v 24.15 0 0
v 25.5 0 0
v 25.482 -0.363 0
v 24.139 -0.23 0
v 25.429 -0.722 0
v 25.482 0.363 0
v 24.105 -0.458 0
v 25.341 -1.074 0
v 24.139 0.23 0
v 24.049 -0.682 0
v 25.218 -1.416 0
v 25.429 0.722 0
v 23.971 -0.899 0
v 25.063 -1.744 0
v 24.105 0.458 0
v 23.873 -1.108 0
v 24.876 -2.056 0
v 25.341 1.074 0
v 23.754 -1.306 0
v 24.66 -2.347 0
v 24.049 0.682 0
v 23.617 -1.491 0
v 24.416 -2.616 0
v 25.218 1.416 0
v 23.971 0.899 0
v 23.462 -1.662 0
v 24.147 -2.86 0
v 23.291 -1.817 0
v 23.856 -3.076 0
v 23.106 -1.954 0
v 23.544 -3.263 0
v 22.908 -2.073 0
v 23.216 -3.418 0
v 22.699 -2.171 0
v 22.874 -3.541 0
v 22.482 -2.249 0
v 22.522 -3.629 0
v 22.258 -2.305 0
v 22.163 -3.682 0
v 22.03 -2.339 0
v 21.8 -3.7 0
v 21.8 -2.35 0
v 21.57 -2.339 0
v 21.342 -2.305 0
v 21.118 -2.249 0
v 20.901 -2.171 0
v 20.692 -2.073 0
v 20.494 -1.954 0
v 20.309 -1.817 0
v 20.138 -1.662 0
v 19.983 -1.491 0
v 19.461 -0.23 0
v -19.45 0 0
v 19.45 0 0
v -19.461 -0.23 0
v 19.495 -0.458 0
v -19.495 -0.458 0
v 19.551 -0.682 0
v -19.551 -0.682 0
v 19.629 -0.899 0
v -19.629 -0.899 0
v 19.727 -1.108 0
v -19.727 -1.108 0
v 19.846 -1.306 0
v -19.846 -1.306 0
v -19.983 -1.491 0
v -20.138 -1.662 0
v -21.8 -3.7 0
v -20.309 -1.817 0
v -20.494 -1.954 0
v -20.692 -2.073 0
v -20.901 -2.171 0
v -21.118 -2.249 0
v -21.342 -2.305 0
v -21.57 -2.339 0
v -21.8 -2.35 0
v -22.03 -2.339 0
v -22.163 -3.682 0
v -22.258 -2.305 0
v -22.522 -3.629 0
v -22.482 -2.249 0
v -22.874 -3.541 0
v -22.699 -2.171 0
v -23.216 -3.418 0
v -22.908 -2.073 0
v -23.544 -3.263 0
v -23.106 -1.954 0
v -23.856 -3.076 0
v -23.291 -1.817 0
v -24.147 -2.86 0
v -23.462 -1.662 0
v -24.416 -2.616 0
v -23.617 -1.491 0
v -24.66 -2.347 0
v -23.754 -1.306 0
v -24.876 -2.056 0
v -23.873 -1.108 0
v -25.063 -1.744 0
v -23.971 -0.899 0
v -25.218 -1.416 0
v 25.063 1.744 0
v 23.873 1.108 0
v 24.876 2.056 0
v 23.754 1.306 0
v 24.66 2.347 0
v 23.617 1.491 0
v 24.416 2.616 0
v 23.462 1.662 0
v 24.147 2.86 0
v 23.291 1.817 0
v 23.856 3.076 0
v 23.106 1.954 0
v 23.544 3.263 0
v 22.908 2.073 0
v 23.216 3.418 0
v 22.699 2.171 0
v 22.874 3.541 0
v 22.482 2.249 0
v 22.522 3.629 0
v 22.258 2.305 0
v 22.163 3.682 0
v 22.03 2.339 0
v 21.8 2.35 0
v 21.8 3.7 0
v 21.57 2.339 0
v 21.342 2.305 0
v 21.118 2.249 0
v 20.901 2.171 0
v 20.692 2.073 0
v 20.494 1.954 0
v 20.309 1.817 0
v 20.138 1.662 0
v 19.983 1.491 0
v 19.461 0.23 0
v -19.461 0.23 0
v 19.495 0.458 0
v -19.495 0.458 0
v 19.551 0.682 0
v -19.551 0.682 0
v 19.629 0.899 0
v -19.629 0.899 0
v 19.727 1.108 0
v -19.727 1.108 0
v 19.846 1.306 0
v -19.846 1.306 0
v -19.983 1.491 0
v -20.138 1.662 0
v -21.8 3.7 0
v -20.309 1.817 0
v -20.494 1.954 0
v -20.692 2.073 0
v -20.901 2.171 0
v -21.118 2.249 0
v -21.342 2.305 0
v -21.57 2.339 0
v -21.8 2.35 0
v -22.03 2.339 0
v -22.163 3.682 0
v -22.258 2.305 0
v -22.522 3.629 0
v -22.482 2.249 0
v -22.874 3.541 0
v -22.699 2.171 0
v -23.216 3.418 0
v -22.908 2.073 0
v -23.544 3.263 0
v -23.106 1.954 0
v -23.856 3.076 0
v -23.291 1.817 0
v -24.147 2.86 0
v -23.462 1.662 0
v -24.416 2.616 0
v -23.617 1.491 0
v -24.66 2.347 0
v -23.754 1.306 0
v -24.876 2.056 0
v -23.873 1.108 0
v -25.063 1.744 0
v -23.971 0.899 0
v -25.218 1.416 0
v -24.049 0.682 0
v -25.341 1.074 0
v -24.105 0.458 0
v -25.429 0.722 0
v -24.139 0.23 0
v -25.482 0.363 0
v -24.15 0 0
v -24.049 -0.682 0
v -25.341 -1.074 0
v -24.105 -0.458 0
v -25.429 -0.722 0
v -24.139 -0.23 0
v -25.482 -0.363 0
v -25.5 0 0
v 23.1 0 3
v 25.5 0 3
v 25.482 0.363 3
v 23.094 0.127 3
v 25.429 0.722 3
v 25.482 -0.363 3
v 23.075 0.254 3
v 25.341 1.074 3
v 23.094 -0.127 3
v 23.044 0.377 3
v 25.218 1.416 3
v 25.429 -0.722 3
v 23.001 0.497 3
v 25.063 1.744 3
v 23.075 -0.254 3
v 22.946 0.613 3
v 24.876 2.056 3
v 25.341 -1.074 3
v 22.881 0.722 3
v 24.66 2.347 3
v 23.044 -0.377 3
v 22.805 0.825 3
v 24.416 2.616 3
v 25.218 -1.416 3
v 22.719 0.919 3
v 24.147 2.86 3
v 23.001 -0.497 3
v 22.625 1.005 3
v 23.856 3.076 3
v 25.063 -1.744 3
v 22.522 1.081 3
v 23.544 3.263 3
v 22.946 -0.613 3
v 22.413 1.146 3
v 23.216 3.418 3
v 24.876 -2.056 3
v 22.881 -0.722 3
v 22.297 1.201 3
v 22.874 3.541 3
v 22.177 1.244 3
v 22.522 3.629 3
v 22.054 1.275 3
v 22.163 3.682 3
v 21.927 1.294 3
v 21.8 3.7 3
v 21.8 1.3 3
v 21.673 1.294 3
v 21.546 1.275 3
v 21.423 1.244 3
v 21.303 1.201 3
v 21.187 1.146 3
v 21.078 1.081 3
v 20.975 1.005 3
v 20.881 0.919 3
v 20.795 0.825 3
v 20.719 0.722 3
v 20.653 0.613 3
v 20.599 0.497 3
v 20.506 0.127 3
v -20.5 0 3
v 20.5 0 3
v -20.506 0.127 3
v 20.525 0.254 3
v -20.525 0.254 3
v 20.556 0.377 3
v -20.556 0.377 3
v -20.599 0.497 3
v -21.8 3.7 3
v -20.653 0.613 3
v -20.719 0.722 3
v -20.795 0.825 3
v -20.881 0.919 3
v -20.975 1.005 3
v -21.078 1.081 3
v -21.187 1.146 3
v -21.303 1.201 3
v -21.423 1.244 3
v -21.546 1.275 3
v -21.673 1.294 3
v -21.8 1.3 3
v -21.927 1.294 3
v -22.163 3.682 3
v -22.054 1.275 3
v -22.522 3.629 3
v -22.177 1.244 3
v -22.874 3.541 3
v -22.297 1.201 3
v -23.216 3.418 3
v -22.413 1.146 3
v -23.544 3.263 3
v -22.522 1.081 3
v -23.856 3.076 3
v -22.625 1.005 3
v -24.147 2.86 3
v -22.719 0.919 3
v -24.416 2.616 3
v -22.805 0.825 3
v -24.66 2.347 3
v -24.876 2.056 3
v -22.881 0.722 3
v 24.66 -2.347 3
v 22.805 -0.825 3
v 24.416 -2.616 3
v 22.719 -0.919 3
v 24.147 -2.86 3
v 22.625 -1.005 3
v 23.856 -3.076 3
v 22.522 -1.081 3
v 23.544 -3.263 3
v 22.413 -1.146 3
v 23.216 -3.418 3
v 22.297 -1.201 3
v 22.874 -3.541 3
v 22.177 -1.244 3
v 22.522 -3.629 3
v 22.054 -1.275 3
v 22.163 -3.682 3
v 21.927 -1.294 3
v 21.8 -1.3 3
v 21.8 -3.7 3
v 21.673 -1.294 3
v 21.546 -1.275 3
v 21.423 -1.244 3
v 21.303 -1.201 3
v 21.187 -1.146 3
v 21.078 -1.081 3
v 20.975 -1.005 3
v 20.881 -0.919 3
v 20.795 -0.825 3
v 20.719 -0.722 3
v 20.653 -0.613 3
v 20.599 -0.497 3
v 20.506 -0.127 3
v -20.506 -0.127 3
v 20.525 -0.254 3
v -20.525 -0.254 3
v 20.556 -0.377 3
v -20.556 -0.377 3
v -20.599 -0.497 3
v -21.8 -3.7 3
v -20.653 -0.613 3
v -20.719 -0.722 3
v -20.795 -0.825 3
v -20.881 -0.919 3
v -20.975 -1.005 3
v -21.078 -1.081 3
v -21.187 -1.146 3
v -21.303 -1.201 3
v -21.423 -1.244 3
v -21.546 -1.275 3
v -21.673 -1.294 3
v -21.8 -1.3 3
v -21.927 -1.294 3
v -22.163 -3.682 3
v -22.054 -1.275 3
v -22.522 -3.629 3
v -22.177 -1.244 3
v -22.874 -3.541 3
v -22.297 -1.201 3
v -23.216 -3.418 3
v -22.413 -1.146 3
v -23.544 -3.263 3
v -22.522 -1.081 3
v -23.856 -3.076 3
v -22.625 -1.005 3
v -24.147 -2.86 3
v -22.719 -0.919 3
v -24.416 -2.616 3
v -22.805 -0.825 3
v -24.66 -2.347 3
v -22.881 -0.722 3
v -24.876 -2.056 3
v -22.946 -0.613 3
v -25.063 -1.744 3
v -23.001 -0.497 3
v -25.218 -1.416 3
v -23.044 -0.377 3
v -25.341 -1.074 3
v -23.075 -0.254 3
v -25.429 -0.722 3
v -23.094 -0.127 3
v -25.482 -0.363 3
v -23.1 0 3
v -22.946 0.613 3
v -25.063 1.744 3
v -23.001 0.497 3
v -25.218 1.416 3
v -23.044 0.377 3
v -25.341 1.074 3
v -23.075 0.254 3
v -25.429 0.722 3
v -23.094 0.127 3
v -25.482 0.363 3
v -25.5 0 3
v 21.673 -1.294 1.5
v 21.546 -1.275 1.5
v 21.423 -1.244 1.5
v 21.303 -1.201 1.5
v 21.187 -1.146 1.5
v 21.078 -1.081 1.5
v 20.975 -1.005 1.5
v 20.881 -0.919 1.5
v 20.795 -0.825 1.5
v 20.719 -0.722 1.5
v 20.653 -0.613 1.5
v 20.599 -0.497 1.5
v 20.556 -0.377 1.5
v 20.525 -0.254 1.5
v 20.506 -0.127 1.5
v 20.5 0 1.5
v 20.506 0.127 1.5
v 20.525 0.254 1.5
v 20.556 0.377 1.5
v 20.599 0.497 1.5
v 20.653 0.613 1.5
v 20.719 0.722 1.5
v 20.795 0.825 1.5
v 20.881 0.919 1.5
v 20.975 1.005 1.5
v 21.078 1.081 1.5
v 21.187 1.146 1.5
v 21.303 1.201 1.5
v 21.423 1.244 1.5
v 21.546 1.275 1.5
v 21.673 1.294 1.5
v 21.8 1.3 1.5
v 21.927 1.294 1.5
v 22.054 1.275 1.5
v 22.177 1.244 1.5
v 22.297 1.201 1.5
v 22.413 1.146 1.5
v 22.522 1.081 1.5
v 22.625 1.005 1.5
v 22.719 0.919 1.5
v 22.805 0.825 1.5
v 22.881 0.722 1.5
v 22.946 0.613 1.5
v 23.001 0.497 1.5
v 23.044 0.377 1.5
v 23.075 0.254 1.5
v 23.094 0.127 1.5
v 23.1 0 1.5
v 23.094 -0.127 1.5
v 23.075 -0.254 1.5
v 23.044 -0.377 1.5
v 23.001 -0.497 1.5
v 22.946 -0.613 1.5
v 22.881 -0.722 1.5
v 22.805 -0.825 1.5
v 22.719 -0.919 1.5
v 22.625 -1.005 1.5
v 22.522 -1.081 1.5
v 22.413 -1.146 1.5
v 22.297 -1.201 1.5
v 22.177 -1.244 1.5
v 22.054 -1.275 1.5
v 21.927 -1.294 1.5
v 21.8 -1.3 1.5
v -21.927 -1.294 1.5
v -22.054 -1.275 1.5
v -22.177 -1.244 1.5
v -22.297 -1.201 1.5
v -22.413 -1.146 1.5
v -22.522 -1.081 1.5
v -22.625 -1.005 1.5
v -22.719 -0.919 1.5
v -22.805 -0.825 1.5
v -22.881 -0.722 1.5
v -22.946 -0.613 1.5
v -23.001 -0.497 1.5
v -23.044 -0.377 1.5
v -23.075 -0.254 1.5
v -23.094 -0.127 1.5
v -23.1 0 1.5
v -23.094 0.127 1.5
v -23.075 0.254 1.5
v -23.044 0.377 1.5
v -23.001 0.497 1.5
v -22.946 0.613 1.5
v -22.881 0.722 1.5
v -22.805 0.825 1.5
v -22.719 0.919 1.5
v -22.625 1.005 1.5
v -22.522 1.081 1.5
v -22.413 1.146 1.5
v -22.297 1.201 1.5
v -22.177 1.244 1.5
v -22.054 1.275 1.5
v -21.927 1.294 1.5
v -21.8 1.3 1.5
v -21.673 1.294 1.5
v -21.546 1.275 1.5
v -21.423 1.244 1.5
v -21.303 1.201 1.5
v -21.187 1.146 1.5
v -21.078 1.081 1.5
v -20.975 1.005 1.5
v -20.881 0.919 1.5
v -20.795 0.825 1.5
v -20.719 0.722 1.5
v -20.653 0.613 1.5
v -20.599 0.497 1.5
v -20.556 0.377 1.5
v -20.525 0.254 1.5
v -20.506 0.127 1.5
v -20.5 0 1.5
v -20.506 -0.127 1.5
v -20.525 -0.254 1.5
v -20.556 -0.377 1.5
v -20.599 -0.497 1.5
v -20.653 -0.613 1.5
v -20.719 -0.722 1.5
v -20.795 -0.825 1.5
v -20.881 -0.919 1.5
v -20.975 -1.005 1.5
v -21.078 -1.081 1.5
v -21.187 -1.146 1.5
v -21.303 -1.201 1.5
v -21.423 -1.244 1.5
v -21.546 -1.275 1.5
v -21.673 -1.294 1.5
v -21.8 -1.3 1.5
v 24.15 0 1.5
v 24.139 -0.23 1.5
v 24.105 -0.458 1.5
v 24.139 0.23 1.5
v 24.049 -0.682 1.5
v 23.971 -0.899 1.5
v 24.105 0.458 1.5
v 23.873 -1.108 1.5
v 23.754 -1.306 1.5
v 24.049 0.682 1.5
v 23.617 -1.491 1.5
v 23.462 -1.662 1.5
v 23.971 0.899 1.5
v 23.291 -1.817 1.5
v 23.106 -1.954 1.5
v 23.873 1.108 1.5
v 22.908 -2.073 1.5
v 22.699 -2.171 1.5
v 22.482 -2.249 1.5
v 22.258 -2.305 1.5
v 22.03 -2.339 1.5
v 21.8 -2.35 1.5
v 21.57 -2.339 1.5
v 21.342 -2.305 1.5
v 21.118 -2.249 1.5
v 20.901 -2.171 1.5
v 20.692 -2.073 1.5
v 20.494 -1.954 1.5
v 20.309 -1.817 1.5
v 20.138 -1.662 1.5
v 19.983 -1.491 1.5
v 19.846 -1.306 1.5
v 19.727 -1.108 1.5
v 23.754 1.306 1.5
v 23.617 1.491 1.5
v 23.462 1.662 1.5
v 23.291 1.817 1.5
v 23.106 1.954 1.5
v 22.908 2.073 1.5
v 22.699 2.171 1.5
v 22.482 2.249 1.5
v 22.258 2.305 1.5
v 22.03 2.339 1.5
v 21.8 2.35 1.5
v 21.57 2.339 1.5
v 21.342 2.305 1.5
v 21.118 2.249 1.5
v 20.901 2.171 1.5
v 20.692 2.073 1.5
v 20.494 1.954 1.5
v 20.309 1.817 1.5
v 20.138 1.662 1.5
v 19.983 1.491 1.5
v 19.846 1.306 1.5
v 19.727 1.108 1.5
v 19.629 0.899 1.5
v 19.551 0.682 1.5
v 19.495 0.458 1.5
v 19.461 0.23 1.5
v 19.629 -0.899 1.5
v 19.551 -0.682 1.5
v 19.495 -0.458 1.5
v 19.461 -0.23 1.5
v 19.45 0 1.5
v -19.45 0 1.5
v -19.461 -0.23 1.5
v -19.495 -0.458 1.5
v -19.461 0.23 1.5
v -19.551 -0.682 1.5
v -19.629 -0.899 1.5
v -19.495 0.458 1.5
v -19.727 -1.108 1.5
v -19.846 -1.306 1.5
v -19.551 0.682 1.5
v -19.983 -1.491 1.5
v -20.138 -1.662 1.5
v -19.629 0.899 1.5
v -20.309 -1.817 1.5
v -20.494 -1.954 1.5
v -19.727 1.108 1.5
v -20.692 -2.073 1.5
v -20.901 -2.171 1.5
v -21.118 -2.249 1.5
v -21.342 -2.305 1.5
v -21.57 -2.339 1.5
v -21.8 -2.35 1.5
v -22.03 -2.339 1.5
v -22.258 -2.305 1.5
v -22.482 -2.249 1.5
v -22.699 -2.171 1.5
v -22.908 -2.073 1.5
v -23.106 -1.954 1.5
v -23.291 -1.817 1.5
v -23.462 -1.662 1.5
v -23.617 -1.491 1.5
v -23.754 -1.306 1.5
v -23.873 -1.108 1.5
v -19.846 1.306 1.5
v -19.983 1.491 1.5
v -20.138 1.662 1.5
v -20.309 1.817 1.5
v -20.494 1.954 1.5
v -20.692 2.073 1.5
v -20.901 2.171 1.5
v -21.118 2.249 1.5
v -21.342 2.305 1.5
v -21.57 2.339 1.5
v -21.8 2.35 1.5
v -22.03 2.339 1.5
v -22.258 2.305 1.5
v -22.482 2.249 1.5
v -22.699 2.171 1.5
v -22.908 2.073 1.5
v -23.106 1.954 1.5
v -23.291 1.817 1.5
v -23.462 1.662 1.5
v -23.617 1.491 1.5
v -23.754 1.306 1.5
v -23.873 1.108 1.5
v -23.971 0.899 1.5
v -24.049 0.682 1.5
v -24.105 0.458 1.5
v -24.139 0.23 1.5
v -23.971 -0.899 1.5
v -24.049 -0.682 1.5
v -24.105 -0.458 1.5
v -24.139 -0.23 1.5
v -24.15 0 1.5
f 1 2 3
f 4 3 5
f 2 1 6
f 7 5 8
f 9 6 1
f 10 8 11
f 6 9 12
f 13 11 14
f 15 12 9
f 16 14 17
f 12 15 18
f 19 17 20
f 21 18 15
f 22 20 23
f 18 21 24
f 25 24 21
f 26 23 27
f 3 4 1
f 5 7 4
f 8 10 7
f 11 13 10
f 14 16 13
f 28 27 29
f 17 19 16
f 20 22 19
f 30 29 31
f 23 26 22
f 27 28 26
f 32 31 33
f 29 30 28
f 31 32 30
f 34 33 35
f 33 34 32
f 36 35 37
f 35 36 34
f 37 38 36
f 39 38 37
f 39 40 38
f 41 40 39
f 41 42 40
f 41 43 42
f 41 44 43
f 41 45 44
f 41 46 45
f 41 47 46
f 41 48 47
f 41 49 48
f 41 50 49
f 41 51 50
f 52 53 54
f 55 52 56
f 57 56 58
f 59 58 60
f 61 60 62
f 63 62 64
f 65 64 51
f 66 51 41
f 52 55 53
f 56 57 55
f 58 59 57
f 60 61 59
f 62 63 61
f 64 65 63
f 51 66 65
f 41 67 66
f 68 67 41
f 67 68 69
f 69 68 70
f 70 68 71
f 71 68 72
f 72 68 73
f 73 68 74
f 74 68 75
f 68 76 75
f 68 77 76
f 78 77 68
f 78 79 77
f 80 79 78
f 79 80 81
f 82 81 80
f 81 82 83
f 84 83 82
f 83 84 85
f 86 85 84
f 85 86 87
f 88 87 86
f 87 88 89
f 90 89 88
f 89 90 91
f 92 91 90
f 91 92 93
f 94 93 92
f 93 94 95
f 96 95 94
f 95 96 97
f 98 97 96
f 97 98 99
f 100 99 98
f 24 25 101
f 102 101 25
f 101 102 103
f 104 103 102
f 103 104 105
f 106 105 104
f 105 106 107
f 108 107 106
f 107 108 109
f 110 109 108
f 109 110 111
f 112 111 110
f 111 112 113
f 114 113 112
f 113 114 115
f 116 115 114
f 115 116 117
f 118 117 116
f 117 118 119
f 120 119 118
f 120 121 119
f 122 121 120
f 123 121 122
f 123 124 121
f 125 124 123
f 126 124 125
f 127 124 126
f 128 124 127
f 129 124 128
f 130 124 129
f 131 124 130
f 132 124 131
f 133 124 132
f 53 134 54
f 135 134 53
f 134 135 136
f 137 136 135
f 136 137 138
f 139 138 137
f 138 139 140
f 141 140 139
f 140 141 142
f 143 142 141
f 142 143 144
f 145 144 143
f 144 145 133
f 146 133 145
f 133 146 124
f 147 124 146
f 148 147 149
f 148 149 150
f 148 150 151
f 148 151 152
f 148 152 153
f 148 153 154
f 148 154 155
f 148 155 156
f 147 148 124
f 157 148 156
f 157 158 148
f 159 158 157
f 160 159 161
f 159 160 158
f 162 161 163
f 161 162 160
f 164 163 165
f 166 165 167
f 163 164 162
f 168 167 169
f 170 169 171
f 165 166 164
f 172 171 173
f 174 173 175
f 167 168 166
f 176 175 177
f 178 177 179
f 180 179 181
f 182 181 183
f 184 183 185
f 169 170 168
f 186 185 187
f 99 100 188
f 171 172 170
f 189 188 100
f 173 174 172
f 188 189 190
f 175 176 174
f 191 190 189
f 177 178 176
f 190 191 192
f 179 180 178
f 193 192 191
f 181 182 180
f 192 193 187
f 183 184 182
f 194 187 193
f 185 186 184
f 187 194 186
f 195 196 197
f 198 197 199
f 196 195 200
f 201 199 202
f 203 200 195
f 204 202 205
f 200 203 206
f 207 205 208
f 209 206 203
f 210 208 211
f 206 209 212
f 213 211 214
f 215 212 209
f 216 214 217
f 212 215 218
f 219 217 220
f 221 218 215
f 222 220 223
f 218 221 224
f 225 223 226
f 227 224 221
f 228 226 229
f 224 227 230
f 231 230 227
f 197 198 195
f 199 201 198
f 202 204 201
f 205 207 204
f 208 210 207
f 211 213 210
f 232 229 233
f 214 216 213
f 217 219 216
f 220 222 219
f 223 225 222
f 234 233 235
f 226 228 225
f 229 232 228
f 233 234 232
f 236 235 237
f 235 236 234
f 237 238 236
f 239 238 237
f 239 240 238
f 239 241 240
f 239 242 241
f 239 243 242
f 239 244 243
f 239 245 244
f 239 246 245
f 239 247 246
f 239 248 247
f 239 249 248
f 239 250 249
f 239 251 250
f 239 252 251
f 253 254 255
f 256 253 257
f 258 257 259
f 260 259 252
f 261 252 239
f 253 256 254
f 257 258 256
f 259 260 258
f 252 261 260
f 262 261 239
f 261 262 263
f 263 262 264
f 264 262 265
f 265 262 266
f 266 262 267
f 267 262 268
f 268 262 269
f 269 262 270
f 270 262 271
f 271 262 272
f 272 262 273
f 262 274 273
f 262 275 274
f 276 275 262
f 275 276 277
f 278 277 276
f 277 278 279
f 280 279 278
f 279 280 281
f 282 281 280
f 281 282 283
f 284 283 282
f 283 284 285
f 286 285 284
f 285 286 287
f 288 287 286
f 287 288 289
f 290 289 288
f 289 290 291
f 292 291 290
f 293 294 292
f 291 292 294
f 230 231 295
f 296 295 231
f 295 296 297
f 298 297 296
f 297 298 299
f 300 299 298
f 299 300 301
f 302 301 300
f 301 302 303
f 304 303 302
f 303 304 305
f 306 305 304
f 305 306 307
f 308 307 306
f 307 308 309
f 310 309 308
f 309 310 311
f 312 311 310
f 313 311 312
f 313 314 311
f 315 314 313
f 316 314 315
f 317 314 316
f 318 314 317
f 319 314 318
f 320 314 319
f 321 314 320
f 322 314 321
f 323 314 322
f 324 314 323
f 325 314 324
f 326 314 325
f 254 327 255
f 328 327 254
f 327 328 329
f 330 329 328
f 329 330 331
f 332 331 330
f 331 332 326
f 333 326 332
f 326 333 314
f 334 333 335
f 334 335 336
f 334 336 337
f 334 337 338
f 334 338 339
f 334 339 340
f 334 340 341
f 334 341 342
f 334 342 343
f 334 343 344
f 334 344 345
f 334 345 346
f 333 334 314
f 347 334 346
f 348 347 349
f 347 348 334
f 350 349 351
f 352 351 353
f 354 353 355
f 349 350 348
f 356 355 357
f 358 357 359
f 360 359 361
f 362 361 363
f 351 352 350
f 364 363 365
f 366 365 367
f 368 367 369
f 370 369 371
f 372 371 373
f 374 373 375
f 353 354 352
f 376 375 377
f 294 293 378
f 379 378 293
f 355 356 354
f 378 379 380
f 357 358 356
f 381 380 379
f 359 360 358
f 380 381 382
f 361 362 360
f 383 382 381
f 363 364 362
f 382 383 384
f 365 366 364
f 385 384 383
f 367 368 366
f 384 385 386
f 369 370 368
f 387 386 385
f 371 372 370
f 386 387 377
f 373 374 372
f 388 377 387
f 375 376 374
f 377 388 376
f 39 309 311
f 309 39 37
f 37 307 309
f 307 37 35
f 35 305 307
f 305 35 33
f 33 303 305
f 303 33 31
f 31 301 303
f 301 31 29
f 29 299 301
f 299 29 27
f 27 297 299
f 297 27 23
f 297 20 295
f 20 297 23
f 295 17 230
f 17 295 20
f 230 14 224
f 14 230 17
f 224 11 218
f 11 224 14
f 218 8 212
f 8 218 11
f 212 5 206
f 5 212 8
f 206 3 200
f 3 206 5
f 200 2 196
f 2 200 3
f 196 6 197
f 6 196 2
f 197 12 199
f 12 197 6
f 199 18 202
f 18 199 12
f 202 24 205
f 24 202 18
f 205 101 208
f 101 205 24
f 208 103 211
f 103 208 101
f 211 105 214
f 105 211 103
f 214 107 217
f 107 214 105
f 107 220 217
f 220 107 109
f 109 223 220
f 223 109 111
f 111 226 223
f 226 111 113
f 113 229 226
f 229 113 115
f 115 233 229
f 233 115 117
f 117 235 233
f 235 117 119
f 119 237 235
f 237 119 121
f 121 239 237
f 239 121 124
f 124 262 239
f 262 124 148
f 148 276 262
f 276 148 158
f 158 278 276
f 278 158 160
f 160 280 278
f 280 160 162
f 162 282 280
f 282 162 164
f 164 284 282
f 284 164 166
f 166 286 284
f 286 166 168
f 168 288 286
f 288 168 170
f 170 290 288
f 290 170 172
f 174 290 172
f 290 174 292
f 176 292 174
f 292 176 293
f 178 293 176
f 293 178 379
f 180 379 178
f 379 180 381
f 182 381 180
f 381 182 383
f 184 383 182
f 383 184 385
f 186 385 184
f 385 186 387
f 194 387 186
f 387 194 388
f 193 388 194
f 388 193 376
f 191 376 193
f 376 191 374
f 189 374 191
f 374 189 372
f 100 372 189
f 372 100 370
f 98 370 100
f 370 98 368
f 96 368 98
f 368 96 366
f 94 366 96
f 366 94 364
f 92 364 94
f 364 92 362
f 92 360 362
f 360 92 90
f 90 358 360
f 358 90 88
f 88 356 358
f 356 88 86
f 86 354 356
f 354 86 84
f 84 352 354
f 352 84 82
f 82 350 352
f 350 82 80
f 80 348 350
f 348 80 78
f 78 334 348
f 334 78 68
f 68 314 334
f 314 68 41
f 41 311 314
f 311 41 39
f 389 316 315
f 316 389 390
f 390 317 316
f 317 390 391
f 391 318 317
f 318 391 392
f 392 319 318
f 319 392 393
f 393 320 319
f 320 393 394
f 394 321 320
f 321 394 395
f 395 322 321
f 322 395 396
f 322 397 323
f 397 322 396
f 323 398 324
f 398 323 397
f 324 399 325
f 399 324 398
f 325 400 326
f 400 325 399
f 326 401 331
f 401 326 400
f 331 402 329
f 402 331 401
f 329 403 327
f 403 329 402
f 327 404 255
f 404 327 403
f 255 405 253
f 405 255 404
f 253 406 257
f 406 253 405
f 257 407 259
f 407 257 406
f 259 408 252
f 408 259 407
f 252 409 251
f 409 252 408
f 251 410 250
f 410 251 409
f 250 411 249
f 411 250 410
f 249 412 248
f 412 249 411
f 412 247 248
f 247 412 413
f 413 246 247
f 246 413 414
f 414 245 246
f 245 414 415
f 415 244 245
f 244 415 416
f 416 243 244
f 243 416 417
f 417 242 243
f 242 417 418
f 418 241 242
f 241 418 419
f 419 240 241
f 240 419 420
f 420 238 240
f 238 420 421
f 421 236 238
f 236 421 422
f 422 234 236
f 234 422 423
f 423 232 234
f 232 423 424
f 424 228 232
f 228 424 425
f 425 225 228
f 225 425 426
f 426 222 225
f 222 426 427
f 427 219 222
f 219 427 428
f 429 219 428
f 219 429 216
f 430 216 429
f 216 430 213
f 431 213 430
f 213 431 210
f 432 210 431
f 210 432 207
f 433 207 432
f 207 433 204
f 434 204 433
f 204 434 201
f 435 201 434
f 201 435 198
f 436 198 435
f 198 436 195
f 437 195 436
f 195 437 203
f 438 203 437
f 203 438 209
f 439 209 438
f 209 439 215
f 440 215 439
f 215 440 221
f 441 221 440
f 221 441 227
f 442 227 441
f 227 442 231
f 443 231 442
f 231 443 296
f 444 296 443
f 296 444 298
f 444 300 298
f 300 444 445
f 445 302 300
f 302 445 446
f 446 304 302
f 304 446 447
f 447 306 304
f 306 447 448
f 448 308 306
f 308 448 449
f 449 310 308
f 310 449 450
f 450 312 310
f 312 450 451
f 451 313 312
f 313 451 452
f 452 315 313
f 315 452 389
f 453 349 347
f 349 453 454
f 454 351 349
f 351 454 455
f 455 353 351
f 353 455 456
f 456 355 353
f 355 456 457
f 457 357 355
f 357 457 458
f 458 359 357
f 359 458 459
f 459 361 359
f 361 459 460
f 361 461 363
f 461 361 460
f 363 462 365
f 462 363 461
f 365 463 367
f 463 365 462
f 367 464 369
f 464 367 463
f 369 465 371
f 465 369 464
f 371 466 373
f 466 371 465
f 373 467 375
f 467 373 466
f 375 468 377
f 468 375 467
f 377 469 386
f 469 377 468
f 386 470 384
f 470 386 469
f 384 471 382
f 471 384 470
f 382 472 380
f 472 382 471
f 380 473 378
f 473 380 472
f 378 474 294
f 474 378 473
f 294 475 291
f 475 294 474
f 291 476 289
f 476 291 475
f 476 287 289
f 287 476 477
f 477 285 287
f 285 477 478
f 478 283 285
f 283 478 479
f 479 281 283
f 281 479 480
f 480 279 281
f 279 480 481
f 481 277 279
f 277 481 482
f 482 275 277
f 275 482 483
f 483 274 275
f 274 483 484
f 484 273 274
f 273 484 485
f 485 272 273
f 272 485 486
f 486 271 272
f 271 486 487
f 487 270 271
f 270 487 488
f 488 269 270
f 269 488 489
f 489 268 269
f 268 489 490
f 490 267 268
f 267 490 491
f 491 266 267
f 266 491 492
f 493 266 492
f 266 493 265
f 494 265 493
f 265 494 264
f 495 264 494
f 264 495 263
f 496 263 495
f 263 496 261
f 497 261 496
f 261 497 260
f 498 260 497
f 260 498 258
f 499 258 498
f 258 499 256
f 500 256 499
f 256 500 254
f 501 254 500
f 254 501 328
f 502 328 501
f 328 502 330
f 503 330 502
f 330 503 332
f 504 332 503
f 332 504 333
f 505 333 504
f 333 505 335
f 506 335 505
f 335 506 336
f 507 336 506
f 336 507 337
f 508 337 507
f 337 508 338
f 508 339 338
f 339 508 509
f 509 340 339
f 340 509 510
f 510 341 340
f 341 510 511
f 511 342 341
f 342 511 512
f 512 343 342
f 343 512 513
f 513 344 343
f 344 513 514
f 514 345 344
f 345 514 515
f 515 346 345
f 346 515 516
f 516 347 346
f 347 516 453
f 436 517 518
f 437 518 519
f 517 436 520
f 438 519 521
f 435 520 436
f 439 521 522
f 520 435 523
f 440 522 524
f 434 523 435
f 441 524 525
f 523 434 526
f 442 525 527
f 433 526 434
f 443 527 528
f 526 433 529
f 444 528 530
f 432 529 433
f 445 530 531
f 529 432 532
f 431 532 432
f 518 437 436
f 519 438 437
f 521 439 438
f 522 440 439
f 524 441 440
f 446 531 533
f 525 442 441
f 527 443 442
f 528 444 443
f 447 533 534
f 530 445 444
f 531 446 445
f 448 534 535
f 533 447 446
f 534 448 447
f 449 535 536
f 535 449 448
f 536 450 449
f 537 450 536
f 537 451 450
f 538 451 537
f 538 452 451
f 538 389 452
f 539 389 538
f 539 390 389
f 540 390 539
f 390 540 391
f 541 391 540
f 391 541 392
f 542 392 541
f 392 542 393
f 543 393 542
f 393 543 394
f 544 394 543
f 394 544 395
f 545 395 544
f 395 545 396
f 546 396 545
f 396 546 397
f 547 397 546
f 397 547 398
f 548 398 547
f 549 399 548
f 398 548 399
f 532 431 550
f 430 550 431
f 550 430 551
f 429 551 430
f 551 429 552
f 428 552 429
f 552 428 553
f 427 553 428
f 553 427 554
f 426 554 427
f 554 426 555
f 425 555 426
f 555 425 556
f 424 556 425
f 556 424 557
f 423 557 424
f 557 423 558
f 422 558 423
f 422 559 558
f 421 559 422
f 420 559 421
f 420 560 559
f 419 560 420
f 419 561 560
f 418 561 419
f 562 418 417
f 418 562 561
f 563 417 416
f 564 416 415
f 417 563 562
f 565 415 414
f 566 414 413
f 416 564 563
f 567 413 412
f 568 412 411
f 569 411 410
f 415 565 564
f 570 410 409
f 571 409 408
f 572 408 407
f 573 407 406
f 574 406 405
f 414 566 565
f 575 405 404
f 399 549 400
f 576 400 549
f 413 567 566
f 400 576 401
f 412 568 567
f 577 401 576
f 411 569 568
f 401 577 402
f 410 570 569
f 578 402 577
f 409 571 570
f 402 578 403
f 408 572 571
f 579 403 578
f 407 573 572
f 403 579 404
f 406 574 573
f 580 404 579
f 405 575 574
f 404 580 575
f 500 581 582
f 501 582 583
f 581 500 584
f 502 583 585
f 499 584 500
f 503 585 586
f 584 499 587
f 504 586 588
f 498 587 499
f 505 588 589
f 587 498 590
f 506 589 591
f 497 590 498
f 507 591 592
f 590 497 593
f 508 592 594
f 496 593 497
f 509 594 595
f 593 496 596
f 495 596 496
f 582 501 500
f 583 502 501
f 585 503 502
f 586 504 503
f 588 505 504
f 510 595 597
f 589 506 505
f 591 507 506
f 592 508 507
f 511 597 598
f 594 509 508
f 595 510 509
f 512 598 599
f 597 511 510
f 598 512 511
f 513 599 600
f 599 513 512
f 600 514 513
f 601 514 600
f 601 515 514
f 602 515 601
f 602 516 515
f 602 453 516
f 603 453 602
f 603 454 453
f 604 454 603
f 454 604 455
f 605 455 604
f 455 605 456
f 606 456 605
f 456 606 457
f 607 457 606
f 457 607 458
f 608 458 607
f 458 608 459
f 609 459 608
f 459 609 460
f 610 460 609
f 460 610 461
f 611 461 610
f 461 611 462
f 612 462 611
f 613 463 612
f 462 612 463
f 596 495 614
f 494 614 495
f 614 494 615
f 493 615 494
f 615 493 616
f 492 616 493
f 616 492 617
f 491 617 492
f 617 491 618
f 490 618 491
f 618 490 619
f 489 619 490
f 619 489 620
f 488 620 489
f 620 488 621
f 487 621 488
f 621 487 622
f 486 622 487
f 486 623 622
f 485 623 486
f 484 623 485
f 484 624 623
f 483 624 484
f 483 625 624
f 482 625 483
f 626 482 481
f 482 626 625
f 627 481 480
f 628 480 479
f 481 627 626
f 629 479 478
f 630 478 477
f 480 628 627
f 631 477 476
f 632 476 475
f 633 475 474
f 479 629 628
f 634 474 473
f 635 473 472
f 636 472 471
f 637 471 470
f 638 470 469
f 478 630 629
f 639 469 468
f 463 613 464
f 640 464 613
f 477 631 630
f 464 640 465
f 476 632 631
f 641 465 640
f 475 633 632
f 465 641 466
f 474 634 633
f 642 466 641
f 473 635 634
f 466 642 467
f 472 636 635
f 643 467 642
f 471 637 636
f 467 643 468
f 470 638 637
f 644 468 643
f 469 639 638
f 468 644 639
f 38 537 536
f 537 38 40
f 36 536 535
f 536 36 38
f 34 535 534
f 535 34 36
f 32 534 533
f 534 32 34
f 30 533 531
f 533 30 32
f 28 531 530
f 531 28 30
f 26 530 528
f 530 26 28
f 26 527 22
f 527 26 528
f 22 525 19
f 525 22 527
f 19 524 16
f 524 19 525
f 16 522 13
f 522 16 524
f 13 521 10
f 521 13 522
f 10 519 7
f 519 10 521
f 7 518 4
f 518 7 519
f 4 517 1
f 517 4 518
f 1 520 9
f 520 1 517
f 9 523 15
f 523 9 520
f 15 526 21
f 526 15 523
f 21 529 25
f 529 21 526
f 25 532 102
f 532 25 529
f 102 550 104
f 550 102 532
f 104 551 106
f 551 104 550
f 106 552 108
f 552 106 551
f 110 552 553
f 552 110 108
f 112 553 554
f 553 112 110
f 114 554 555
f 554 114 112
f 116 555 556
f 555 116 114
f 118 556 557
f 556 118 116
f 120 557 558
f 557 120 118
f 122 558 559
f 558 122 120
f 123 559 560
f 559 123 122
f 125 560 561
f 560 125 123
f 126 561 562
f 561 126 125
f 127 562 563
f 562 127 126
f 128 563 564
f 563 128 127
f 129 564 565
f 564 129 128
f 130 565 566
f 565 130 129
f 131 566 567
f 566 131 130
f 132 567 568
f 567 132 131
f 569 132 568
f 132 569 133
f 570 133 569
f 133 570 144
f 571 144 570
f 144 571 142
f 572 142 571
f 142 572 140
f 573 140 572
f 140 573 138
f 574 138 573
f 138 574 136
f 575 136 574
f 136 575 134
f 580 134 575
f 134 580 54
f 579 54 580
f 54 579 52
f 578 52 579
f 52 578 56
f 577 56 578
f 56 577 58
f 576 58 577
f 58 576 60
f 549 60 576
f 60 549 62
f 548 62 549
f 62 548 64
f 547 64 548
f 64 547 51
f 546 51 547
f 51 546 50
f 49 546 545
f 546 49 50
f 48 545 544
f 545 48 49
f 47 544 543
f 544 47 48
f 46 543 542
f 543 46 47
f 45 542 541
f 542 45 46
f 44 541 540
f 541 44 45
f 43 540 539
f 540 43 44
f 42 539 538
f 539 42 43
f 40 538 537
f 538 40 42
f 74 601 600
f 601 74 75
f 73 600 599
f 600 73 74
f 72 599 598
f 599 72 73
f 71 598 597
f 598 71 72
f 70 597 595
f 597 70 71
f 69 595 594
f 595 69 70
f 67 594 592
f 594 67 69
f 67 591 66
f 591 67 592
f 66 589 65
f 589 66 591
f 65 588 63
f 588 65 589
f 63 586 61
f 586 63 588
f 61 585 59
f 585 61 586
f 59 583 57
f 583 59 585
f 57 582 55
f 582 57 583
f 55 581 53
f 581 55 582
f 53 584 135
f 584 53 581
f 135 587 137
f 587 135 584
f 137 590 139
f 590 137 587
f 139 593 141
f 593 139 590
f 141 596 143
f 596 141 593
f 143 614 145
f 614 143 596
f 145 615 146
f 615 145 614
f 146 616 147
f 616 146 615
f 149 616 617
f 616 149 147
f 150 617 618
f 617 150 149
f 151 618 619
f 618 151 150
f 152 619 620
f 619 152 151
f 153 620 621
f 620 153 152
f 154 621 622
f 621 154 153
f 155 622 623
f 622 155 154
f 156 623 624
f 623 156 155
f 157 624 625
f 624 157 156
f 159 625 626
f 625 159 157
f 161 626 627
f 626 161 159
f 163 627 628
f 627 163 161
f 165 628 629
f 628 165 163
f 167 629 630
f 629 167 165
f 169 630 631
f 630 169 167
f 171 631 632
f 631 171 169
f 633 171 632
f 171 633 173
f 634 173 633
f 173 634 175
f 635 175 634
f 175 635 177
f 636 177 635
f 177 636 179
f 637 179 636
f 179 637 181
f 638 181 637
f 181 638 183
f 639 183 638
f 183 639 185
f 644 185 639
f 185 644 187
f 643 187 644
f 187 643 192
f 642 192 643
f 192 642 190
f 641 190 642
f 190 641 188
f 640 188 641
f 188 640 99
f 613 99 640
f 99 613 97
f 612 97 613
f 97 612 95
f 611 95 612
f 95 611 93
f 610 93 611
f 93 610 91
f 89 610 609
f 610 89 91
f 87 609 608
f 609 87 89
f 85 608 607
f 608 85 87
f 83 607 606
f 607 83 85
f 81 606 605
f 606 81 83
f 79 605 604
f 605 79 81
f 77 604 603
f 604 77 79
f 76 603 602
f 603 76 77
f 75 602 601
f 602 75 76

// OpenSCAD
// FRED Motor Holdy thingy

$fn = 64;

rod_outer_d = 4.5+0.2;
screw_hole_d = 2.4+0.2;
hole_outer_dist = 48.3;
rod_offset_d = 7.4;
rod_thick = 3.0;
x_offset = hole_outer_dist/2 - rod_outer_d/2;


module holes2D() {
    difference() {
        hull() {
            translate([x_offset,0,0])
            circle(d=rod_offset_d);
            translate([-x_offset,0,0])
            circle(d=rod_offset_d);
        }
        translate([x_offset,0,0])
        circle(d=screw_hole_d);
        translate([-x_offset,0,0])
        circle(d=screw_hole_d);
        
    }
}
difference() {
    linear_extrude(rod_thick)
    holes2D();
    linear_extrude(rod_thick/2) {
        translate([x_offset,0,0])
        circle(d=rod_outer_d);
        translate([-x_offset,0,0])
        circle(d=rod_outer_d);
    }
}
